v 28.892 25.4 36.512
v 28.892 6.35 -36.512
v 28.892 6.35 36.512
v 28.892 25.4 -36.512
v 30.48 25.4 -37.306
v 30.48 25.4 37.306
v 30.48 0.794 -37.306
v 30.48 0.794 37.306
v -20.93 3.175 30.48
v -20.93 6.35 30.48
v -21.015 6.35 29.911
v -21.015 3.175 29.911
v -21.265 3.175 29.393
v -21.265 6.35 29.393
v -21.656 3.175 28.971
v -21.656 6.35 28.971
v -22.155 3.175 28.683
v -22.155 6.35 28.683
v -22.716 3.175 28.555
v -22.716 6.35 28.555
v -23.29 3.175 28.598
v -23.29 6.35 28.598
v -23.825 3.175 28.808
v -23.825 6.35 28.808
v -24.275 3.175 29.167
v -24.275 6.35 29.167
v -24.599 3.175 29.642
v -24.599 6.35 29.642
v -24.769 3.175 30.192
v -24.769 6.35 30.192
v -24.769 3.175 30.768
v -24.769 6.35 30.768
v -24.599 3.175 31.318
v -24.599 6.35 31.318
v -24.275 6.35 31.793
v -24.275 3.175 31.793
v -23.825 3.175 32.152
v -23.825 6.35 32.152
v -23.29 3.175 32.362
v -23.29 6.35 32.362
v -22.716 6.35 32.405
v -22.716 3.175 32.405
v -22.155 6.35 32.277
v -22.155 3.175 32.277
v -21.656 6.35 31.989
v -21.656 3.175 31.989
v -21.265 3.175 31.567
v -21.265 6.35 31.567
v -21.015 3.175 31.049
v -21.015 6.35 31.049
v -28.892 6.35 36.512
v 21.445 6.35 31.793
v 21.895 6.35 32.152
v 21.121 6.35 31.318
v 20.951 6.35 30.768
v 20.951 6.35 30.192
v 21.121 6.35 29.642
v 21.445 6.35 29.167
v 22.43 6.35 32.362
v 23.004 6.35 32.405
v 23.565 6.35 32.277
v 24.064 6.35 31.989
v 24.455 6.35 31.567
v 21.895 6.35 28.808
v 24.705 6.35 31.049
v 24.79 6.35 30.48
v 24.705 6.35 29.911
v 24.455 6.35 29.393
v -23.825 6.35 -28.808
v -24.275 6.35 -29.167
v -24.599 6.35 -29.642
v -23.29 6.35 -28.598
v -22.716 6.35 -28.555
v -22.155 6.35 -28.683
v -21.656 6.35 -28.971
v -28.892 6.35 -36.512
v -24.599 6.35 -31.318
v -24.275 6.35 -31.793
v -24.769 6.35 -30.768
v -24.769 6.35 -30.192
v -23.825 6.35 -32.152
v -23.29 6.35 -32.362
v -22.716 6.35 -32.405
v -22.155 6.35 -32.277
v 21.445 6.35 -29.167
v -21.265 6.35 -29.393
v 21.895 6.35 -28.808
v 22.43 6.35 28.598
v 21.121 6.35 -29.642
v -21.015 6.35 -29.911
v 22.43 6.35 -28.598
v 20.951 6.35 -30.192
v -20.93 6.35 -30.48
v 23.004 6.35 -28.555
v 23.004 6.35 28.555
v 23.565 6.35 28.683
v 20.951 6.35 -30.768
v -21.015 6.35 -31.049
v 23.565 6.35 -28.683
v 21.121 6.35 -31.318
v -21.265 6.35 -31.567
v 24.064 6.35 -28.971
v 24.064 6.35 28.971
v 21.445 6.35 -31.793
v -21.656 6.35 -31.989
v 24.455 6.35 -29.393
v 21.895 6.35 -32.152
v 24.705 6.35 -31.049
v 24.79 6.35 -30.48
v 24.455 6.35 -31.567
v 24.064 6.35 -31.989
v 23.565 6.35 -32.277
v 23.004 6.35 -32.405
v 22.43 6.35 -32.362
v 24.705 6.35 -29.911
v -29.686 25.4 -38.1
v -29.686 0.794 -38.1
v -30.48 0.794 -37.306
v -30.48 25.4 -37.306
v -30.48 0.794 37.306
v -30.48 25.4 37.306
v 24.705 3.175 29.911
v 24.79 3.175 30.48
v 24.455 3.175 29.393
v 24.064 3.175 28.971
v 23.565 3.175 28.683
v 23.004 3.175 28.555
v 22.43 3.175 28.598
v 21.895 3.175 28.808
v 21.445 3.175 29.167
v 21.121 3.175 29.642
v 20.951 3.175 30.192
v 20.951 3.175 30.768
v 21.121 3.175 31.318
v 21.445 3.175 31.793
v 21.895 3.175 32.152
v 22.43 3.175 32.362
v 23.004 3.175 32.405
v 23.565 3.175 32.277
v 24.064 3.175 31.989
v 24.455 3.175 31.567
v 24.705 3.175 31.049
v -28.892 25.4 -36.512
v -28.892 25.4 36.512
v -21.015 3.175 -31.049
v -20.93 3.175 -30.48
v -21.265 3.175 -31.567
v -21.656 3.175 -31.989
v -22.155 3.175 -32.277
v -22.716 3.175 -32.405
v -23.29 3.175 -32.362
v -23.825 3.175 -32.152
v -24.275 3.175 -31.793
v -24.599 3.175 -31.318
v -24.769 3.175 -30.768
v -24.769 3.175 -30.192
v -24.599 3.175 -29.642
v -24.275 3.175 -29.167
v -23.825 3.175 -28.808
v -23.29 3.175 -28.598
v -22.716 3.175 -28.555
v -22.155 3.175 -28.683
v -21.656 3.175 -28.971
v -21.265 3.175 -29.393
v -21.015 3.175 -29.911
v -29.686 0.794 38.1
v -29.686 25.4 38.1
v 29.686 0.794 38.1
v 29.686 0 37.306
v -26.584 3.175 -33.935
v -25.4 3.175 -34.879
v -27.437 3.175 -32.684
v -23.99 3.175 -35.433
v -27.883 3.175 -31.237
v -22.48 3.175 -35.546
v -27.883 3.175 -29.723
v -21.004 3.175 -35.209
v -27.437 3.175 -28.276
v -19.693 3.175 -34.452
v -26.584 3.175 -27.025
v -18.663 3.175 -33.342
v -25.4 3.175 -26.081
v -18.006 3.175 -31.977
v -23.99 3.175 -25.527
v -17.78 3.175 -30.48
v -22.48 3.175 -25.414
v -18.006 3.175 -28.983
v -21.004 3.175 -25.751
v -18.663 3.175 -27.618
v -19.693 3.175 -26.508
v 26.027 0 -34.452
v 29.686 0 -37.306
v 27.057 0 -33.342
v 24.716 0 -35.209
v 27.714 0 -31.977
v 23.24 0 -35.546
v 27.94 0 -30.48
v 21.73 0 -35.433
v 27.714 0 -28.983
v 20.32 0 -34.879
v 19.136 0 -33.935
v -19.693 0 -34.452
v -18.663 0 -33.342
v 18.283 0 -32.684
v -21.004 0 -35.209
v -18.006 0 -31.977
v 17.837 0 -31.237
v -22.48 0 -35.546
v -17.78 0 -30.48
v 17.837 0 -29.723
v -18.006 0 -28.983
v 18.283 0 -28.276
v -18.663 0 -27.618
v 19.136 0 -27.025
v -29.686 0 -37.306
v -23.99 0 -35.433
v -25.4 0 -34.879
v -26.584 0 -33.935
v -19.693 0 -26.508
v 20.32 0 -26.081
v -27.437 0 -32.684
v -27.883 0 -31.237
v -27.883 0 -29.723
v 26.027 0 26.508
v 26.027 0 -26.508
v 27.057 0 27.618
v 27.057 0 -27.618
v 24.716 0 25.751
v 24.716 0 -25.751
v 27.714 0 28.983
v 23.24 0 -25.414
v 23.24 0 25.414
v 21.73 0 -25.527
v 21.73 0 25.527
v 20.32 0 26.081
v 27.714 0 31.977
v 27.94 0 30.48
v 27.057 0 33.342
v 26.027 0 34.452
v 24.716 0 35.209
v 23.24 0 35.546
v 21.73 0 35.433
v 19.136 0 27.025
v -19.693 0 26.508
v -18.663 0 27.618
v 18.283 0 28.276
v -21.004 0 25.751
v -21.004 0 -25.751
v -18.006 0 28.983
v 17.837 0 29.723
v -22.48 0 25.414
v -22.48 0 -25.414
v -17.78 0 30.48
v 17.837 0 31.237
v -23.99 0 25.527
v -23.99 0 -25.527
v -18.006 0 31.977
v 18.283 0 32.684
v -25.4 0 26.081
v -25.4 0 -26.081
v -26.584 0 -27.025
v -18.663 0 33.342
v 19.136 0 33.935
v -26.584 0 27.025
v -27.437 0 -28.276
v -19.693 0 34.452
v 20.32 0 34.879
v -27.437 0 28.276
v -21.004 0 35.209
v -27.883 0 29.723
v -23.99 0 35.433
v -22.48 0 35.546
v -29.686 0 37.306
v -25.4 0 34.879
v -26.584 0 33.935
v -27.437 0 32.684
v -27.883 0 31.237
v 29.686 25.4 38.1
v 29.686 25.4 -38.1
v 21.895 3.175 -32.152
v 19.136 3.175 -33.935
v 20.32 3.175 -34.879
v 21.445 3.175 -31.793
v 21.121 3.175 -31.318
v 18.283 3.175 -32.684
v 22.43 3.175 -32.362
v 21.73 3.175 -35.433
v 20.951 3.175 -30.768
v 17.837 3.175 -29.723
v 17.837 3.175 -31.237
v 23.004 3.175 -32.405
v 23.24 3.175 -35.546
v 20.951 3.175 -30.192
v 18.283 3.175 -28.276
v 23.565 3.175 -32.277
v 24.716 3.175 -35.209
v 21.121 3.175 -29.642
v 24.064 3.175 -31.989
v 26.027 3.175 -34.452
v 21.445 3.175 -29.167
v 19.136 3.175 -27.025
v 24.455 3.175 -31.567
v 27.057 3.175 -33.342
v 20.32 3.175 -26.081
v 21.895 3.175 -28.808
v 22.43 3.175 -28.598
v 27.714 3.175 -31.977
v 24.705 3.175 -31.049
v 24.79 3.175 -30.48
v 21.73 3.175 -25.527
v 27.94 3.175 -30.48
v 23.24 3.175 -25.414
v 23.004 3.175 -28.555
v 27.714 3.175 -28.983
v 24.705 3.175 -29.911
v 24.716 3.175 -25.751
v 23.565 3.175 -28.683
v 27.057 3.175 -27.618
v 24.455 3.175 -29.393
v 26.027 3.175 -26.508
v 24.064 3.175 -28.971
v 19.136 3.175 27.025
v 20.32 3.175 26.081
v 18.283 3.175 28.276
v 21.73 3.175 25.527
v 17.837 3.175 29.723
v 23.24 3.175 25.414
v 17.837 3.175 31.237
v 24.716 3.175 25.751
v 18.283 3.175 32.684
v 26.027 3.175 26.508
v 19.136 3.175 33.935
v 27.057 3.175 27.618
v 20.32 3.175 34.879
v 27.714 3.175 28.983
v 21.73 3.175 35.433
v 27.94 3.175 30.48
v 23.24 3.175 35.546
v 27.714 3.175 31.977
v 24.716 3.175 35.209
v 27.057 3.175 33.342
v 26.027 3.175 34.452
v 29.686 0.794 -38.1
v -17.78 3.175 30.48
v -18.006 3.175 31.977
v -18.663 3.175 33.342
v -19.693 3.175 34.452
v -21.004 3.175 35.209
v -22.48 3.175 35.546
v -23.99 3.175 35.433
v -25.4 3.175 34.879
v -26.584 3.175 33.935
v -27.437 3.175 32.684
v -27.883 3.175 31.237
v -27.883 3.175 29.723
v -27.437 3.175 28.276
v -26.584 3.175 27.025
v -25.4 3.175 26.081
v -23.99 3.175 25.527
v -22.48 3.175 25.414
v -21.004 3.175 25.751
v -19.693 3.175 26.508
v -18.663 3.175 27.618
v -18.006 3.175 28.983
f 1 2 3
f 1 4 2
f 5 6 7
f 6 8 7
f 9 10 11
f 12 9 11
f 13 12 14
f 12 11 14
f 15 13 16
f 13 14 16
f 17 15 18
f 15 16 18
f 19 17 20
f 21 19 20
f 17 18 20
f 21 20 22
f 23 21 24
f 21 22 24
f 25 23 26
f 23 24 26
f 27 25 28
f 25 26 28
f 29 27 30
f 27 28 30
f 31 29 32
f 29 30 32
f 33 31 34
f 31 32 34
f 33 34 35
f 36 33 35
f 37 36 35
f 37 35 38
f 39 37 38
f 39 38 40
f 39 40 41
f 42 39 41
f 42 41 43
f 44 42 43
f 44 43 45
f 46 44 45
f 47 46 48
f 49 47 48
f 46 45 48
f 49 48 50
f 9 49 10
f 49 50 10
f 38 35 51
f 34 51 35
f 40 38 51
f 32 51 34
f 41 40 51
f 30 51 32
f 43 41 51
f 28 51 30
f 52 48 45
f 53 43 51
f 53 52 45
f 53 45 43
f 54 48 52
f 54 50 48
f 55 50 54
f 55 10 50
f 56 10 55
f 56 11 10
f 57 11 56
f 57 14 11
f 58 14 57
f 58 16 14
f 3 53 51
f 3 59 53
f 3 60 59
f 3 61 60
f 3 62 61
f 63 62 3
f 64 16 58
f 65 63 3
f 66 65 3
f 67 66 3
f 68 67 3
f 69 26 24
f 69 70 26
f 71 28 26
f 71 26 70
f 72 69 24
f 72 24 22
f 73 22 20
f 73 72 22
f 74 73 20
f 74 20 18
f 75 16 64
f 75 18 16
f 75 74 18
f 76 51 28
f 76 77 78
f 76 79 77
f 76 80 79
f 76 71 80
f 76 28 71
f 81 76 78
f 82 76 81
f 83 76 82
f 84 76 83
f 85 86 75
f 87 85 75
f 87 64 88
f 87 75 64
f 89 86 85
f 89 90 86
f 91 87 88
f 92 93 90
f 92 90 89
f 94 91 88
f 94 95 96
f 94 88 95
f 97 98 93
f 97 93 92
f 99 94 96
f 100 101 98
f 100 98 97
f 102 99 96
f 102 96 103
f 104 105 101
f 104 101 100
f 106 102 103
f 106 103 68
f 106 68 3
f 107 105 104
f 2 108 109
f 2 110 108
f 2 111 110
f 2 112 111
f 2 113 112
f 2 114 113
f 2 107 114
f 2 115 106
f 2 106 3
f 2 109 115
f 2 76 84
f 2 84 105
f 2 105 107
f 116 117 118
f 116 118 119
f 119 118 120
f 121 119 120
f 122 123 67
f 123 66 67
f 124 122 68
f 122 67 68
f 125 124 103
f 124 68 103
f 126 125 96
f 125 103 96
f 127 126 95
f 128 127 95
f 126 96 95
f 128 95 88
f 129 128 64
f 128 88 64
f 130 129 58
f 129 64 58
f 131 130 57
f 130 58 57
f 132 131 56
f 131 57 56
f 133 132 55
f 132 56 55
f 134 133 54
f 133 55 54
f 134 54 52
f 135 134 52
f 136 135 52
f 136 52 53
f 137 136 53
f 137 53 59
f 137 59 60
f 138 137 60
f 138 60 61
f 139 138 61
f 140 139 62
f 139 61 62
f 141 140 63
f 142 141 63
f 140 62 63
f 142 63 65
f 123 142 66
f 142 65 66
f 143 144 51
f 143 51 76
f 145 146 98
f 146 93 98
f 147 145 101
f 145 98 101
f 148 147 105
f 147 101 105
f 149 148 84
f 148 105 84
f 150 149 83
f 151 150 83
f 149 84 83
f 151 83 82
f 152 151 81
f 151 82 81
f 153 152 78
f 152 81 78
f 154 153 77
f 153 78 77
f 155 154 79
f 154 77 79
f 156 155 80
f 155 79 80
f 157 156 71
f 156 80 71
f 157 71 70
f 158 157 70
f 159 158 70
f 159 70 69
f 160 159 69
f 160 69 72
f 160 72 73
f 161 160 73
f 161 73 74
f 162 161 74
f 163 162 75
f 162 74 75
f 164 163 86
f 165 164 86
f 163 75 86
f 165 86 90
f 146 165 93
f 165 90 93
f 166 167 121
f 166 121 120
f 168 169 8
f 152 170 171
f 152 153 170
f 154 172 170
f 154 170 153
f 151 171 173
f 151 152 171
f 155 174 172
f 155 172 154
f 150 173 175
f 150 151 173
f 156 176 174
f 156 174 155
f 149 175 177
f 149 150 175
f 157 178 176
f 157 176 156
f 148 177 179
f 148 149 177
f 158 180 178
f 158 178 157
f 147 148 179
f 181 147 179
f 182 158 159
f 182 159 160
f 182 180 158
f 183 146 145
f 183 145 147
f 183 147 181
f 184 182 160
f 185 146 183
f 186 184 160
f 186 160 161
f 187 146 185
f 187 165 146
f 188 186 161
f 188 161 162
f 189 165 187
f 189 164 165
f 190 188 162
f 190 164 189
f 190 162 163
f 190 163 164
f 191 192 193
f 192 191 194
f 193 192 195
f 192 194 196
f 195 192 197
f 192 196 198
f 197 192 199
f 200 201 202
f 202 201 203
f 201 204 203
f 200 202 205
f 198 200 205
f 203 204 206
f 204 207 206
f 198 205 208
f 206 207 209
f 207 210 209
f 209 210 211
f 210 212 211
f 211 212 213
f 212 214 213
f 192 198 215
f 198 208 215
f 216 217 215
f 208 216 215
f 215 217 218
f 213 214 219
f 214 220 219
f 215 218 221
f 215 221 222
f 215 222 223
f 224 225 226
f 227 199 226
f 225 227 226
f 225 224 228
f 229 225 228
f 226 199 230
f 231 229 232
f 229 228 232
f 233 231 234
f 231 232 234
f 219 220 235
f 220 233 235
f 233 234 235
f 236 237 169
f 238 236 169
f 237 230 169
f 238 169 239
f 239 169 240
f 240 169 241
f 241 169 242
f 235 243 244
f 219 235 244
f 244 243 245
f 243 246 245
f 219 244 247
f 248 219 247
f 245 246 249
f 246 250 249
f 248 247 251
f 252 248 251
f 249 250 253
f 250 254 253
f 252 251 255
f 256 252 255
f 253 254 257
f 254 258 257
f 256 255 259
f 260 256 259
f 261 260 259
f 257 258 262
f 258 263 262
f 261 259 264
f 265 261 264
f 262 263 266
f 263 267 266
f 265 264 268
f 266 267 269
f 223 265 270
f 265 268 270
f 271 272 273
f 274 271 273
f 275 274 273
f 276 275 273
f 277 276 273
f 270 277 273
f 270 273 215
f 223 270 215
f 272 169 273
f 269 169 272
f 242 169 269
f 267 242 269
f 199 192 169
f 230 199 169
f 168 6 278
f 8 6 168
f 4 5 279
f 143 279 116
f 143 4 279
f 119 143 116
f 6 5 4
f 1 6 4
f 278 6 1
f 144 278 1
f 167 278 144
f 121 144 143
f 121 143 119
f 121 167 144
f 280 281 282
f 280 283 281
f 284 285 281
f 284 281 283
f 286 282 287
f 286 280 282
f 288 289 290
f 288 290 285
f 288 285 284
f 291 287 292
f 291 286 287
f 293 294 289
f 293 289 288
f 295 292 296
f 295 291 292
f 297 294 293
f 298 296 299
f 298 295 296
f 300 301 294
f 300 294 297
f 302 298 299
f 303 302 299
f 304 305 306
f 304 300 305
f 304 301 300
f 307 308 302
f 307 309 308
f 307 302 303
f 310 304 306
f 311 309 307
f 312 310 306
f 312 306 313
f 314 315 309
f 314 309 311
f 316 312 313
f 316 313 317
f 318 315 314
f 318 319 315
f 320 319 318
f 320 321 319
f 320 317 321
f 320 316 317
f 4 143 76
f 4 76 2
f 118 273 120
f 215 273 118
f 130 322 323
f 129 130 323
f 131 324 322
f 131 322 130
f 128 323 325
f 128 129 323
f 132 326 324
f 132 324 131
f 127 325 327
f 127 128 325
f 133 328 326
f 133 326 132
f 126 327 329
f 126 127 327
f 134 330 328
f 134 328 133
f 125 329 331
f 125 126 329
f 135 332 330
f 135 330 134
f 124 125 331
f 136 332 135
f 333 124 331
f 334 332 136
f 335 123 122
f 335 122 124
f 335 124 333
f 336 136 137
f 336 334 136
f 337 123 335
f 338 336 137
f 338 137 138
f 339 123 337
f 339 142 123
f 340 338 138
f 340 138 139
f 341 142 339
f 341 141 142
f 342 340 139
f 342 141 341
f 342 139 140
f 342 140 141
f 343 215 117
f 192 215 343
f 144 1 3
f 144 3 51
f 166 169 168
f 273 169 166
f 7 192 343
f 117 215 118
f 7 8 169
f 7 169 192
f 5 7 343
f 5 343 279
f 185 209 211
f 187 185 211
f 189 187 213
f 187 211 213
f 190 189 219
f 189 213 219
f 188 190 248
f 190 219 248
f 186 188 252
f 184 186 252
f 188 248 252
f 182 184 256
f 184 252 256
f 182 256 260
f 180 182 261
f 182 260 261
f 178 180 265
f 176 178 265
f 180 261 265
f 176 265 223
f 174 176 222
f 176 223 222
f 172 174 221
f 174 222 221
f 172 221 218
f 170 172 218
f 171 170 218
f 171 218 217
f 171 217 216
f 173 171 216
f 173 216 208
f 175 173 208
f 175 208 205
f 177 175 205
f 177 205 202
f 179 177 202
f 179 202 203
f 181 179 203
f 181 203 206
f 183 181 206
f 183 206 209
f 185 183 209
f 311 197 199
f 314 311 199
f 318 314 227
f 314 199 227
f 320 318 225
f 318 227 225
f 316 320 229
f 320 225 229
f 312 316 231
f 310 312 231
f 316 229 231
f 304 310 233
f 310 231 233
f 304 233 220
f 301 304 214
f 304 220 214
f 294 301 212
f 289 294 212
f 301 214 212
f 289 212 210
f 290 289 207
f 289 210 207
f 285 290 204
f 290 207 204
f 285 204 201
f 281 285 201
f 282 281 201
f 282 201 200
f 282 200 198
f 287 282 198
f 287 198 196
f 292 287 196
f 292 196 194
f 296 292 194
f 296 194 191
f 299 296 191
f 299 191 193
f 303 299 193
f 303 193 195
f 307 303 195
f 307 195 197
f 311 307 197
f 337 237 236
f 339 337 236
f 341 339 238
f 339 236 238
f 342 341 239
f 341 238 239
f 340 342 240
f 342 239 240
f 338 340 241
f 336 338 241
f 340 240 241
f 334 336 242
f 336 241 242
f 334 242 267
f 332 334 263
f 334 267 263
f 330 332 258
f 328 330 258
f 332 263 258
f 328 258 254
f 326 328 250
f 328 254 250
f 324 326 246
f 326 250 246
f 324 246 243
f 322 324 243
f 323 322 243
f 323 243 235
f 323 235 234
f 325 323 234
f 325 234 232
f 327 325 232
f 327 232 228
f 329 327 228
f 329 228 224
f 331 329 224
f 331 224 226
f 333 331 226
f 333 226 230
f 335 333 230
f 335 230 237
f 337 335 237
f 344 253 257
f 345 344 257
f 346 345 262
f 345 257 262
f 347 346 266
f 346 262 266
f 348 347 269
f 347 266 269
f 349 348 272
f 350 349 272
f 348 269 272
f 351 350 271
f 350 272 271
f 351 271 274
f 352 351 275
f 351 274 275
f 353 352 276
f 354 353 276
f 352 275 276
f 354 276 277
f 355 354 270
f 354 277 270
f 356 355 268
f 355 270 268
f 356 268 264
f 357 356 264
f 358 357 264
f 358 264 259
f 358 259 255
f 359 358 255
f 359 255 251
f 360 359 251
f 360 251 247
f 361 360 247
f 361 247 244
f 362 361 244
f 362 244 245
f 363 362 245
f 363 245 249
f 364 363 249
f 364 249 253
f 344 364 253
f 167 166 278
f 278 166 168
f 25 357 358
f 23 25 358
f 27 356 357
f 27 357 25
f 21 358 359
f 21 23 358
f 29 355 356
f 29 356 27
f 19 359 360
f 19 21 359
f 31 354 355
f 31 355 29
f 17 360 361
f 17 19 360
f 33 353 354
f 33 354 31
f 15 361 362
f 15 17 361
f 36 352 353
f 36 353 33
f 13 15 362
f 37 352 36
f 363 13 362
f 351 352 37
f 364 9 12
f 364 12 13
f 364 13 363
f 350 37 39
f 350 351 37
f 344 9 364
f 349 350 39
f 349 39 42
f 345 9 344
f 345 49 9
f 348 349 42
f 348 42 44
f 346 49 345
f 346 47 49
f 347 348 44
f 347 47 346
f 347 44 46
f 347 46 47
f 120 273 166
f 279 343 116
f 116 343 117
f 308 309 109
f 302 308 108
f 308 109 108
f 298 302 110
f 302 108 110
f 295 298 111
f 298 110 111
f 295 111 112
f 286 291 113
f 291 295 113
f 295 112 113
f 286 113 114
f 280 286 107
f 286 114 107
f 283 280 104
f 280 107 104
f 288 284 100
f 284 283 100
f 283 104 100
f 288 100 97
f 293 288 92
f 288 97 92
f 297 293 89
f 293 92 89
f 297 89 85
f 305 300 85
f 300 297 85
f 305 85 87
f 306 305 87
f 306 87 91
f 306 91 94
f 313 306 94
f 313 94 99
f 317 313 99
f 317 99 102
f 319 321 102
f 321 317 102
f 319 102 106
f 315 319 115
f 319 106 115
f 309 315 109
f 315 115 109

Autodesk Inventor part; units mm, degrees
ref_plane "YZ Plane" through (0, 0, 0) normal (1, 0, 0) x (0, 1, 0)
ref_plane "XZ Plane" through (0, 0, 0) normal (0, 1, 0) x (-1, 0, 0)
ref_plane "XY Plane" through (0, 0, 0) normal (0, 0, 1) x (1, 0, 0)
sketch "Sketch1" plane through (0, 0, 0) normal (0, 1, 0) x (-1, 0, 0)
  line L0 (30.48, 38.1) -> (-30.48, 38.1)
  line L1 (-30.48, 38.1) -> (-30.48, -38.1)
  line L2 (-30.48, -38.1) -> (30.48, -38.1)
  line L3 (30.48, -38.1) -> (30.48, 38.1)
  point P0 (0, 0)
  dimension "d0" = 76.2
  dimension "d1" = 60.96
  dimension "d2" = 38.1
  dimension "d3" = 30.48
extrude "Extrusion1" add sketch "Sketch1" along normal blind 25.4
sketch "Sketch2" plane through (0, 25.4, 0) normal (0, 1, 0) x (1, 0, 0)
  line L0 (-28.8925, 36.5125) -> (28.8925, 36.5125)
  line L1 (28.8925, 36.5125) -> (28.8925, -36.5125)
  line L2 (28.8925, -36.5125) -> (-28.8925, -36.5125)
  line L3 (-28.8925, -36.5125) -> (-28.8925, 36.5125)
  point P0 (0, 0)
  dimension "d6" = 73.025
  dimension "d7" = 57.785
  dimension "d8" = 36.5125
  dimension "d9" = 28.8925
extrude "Extrusion2" cut sketch "Sketch2" against normal blind 19.05
chamfer "Chamfer1" distance 0.7937 angle 45 8 edges at (0, 0, 38.1) (30.48, 0, 0) (0, 0, -38.1) (-30.48, 0, 0) (30.48, 12.7, 38.1) (-30.48, 12.7, 38.1) (30.48, 12.7, -38.1) (-30.48, 12.7, -38.1)
sketch "Sketch3" plane through (0, 6.35, 0) normal (0, 1, 0) x (1, 0, 0)
  circle A0 centre (-22.86, 30.48) radius 1.9304
  circle A1 centre (22.86, 30.48) radius 1.9304
  circle A2 centre (-22.86, -30.48) radius 1.9304
  circle A3 centre (22.86, -30.48) radius 1.9304
  line L0 (-28.8925, -36.5125) -> (-28.8925, 36.5125) projected
  line L1 (-28.8925, 36.5125) -> (28.8925, 36.5125) projected
  line L2 (0, 0) -> (0, 32.9664)
  line L3 (0, 0) -> (-24.0434, 0)
  line L4 (0, 0) -> (25.6064, 0)
  line L5 (0, 0) -> (0, -31.6413)
  dimension "d15" = 3.8608
  dimension "d16" = 3.8608
  dimension "d17" = 3.8608
  dimension "d18" = 3.8608
  dimension "d21" = 30.48
  dimension "d22" = 22.86
  dimension "d23" = 22.86
  dimension "d24" = 30.48
  dimension "d25" = 22.86
  dimension "d26" = 30.48
  dimension "d27" = 22.86
  dimension "d28" = 30.48
extrude "Extrusion3" cut sketch "Sketch3" against normal blind 6.35
sketch "Sketch4" plane through (0, 0, 0) normal (0, -1, 0) x (1, 0, 0)
  circle A0 centre (-22.86, 30.48) radius 5.08
  line L0 (0, 0) -> (-26.2361, 0)
  line L1 (-26.2361, 0) -> (0, 0)
  line L2 (0, 0) -> (0, 35.0708)
  line L3 (0, 0) -> (27.0223, 0)
  line L4 (0, 0) -> (0, -33.193)
  circle A1 centre (22.86, 30.48) radius 5.08
  circle A2 centre (-22.86, -30.48) radius 5.08
  circle A3 centre (22.86, -30.48) radius 1.9304 projected
  circle A4 centre (22.86, -30.48) radius 5.08
  dimension "d31" = 10.16
  dimension "d32" = 22.86
  dimension "d33" = 30.48
  dimension "d34" = 10.16
  dimension "d35" = 22.86
  dimension "d36" = 30.48
  dimension "d37" = 10.16
  dimension "d38" = 10.16
  dimension "d39" = 30.48
  dimension "d40" = 22.86
extrude "Extrusion4" cut sketch "Sketch4" against normal blind 3.175
properties part number "Enclosure Rev A"
